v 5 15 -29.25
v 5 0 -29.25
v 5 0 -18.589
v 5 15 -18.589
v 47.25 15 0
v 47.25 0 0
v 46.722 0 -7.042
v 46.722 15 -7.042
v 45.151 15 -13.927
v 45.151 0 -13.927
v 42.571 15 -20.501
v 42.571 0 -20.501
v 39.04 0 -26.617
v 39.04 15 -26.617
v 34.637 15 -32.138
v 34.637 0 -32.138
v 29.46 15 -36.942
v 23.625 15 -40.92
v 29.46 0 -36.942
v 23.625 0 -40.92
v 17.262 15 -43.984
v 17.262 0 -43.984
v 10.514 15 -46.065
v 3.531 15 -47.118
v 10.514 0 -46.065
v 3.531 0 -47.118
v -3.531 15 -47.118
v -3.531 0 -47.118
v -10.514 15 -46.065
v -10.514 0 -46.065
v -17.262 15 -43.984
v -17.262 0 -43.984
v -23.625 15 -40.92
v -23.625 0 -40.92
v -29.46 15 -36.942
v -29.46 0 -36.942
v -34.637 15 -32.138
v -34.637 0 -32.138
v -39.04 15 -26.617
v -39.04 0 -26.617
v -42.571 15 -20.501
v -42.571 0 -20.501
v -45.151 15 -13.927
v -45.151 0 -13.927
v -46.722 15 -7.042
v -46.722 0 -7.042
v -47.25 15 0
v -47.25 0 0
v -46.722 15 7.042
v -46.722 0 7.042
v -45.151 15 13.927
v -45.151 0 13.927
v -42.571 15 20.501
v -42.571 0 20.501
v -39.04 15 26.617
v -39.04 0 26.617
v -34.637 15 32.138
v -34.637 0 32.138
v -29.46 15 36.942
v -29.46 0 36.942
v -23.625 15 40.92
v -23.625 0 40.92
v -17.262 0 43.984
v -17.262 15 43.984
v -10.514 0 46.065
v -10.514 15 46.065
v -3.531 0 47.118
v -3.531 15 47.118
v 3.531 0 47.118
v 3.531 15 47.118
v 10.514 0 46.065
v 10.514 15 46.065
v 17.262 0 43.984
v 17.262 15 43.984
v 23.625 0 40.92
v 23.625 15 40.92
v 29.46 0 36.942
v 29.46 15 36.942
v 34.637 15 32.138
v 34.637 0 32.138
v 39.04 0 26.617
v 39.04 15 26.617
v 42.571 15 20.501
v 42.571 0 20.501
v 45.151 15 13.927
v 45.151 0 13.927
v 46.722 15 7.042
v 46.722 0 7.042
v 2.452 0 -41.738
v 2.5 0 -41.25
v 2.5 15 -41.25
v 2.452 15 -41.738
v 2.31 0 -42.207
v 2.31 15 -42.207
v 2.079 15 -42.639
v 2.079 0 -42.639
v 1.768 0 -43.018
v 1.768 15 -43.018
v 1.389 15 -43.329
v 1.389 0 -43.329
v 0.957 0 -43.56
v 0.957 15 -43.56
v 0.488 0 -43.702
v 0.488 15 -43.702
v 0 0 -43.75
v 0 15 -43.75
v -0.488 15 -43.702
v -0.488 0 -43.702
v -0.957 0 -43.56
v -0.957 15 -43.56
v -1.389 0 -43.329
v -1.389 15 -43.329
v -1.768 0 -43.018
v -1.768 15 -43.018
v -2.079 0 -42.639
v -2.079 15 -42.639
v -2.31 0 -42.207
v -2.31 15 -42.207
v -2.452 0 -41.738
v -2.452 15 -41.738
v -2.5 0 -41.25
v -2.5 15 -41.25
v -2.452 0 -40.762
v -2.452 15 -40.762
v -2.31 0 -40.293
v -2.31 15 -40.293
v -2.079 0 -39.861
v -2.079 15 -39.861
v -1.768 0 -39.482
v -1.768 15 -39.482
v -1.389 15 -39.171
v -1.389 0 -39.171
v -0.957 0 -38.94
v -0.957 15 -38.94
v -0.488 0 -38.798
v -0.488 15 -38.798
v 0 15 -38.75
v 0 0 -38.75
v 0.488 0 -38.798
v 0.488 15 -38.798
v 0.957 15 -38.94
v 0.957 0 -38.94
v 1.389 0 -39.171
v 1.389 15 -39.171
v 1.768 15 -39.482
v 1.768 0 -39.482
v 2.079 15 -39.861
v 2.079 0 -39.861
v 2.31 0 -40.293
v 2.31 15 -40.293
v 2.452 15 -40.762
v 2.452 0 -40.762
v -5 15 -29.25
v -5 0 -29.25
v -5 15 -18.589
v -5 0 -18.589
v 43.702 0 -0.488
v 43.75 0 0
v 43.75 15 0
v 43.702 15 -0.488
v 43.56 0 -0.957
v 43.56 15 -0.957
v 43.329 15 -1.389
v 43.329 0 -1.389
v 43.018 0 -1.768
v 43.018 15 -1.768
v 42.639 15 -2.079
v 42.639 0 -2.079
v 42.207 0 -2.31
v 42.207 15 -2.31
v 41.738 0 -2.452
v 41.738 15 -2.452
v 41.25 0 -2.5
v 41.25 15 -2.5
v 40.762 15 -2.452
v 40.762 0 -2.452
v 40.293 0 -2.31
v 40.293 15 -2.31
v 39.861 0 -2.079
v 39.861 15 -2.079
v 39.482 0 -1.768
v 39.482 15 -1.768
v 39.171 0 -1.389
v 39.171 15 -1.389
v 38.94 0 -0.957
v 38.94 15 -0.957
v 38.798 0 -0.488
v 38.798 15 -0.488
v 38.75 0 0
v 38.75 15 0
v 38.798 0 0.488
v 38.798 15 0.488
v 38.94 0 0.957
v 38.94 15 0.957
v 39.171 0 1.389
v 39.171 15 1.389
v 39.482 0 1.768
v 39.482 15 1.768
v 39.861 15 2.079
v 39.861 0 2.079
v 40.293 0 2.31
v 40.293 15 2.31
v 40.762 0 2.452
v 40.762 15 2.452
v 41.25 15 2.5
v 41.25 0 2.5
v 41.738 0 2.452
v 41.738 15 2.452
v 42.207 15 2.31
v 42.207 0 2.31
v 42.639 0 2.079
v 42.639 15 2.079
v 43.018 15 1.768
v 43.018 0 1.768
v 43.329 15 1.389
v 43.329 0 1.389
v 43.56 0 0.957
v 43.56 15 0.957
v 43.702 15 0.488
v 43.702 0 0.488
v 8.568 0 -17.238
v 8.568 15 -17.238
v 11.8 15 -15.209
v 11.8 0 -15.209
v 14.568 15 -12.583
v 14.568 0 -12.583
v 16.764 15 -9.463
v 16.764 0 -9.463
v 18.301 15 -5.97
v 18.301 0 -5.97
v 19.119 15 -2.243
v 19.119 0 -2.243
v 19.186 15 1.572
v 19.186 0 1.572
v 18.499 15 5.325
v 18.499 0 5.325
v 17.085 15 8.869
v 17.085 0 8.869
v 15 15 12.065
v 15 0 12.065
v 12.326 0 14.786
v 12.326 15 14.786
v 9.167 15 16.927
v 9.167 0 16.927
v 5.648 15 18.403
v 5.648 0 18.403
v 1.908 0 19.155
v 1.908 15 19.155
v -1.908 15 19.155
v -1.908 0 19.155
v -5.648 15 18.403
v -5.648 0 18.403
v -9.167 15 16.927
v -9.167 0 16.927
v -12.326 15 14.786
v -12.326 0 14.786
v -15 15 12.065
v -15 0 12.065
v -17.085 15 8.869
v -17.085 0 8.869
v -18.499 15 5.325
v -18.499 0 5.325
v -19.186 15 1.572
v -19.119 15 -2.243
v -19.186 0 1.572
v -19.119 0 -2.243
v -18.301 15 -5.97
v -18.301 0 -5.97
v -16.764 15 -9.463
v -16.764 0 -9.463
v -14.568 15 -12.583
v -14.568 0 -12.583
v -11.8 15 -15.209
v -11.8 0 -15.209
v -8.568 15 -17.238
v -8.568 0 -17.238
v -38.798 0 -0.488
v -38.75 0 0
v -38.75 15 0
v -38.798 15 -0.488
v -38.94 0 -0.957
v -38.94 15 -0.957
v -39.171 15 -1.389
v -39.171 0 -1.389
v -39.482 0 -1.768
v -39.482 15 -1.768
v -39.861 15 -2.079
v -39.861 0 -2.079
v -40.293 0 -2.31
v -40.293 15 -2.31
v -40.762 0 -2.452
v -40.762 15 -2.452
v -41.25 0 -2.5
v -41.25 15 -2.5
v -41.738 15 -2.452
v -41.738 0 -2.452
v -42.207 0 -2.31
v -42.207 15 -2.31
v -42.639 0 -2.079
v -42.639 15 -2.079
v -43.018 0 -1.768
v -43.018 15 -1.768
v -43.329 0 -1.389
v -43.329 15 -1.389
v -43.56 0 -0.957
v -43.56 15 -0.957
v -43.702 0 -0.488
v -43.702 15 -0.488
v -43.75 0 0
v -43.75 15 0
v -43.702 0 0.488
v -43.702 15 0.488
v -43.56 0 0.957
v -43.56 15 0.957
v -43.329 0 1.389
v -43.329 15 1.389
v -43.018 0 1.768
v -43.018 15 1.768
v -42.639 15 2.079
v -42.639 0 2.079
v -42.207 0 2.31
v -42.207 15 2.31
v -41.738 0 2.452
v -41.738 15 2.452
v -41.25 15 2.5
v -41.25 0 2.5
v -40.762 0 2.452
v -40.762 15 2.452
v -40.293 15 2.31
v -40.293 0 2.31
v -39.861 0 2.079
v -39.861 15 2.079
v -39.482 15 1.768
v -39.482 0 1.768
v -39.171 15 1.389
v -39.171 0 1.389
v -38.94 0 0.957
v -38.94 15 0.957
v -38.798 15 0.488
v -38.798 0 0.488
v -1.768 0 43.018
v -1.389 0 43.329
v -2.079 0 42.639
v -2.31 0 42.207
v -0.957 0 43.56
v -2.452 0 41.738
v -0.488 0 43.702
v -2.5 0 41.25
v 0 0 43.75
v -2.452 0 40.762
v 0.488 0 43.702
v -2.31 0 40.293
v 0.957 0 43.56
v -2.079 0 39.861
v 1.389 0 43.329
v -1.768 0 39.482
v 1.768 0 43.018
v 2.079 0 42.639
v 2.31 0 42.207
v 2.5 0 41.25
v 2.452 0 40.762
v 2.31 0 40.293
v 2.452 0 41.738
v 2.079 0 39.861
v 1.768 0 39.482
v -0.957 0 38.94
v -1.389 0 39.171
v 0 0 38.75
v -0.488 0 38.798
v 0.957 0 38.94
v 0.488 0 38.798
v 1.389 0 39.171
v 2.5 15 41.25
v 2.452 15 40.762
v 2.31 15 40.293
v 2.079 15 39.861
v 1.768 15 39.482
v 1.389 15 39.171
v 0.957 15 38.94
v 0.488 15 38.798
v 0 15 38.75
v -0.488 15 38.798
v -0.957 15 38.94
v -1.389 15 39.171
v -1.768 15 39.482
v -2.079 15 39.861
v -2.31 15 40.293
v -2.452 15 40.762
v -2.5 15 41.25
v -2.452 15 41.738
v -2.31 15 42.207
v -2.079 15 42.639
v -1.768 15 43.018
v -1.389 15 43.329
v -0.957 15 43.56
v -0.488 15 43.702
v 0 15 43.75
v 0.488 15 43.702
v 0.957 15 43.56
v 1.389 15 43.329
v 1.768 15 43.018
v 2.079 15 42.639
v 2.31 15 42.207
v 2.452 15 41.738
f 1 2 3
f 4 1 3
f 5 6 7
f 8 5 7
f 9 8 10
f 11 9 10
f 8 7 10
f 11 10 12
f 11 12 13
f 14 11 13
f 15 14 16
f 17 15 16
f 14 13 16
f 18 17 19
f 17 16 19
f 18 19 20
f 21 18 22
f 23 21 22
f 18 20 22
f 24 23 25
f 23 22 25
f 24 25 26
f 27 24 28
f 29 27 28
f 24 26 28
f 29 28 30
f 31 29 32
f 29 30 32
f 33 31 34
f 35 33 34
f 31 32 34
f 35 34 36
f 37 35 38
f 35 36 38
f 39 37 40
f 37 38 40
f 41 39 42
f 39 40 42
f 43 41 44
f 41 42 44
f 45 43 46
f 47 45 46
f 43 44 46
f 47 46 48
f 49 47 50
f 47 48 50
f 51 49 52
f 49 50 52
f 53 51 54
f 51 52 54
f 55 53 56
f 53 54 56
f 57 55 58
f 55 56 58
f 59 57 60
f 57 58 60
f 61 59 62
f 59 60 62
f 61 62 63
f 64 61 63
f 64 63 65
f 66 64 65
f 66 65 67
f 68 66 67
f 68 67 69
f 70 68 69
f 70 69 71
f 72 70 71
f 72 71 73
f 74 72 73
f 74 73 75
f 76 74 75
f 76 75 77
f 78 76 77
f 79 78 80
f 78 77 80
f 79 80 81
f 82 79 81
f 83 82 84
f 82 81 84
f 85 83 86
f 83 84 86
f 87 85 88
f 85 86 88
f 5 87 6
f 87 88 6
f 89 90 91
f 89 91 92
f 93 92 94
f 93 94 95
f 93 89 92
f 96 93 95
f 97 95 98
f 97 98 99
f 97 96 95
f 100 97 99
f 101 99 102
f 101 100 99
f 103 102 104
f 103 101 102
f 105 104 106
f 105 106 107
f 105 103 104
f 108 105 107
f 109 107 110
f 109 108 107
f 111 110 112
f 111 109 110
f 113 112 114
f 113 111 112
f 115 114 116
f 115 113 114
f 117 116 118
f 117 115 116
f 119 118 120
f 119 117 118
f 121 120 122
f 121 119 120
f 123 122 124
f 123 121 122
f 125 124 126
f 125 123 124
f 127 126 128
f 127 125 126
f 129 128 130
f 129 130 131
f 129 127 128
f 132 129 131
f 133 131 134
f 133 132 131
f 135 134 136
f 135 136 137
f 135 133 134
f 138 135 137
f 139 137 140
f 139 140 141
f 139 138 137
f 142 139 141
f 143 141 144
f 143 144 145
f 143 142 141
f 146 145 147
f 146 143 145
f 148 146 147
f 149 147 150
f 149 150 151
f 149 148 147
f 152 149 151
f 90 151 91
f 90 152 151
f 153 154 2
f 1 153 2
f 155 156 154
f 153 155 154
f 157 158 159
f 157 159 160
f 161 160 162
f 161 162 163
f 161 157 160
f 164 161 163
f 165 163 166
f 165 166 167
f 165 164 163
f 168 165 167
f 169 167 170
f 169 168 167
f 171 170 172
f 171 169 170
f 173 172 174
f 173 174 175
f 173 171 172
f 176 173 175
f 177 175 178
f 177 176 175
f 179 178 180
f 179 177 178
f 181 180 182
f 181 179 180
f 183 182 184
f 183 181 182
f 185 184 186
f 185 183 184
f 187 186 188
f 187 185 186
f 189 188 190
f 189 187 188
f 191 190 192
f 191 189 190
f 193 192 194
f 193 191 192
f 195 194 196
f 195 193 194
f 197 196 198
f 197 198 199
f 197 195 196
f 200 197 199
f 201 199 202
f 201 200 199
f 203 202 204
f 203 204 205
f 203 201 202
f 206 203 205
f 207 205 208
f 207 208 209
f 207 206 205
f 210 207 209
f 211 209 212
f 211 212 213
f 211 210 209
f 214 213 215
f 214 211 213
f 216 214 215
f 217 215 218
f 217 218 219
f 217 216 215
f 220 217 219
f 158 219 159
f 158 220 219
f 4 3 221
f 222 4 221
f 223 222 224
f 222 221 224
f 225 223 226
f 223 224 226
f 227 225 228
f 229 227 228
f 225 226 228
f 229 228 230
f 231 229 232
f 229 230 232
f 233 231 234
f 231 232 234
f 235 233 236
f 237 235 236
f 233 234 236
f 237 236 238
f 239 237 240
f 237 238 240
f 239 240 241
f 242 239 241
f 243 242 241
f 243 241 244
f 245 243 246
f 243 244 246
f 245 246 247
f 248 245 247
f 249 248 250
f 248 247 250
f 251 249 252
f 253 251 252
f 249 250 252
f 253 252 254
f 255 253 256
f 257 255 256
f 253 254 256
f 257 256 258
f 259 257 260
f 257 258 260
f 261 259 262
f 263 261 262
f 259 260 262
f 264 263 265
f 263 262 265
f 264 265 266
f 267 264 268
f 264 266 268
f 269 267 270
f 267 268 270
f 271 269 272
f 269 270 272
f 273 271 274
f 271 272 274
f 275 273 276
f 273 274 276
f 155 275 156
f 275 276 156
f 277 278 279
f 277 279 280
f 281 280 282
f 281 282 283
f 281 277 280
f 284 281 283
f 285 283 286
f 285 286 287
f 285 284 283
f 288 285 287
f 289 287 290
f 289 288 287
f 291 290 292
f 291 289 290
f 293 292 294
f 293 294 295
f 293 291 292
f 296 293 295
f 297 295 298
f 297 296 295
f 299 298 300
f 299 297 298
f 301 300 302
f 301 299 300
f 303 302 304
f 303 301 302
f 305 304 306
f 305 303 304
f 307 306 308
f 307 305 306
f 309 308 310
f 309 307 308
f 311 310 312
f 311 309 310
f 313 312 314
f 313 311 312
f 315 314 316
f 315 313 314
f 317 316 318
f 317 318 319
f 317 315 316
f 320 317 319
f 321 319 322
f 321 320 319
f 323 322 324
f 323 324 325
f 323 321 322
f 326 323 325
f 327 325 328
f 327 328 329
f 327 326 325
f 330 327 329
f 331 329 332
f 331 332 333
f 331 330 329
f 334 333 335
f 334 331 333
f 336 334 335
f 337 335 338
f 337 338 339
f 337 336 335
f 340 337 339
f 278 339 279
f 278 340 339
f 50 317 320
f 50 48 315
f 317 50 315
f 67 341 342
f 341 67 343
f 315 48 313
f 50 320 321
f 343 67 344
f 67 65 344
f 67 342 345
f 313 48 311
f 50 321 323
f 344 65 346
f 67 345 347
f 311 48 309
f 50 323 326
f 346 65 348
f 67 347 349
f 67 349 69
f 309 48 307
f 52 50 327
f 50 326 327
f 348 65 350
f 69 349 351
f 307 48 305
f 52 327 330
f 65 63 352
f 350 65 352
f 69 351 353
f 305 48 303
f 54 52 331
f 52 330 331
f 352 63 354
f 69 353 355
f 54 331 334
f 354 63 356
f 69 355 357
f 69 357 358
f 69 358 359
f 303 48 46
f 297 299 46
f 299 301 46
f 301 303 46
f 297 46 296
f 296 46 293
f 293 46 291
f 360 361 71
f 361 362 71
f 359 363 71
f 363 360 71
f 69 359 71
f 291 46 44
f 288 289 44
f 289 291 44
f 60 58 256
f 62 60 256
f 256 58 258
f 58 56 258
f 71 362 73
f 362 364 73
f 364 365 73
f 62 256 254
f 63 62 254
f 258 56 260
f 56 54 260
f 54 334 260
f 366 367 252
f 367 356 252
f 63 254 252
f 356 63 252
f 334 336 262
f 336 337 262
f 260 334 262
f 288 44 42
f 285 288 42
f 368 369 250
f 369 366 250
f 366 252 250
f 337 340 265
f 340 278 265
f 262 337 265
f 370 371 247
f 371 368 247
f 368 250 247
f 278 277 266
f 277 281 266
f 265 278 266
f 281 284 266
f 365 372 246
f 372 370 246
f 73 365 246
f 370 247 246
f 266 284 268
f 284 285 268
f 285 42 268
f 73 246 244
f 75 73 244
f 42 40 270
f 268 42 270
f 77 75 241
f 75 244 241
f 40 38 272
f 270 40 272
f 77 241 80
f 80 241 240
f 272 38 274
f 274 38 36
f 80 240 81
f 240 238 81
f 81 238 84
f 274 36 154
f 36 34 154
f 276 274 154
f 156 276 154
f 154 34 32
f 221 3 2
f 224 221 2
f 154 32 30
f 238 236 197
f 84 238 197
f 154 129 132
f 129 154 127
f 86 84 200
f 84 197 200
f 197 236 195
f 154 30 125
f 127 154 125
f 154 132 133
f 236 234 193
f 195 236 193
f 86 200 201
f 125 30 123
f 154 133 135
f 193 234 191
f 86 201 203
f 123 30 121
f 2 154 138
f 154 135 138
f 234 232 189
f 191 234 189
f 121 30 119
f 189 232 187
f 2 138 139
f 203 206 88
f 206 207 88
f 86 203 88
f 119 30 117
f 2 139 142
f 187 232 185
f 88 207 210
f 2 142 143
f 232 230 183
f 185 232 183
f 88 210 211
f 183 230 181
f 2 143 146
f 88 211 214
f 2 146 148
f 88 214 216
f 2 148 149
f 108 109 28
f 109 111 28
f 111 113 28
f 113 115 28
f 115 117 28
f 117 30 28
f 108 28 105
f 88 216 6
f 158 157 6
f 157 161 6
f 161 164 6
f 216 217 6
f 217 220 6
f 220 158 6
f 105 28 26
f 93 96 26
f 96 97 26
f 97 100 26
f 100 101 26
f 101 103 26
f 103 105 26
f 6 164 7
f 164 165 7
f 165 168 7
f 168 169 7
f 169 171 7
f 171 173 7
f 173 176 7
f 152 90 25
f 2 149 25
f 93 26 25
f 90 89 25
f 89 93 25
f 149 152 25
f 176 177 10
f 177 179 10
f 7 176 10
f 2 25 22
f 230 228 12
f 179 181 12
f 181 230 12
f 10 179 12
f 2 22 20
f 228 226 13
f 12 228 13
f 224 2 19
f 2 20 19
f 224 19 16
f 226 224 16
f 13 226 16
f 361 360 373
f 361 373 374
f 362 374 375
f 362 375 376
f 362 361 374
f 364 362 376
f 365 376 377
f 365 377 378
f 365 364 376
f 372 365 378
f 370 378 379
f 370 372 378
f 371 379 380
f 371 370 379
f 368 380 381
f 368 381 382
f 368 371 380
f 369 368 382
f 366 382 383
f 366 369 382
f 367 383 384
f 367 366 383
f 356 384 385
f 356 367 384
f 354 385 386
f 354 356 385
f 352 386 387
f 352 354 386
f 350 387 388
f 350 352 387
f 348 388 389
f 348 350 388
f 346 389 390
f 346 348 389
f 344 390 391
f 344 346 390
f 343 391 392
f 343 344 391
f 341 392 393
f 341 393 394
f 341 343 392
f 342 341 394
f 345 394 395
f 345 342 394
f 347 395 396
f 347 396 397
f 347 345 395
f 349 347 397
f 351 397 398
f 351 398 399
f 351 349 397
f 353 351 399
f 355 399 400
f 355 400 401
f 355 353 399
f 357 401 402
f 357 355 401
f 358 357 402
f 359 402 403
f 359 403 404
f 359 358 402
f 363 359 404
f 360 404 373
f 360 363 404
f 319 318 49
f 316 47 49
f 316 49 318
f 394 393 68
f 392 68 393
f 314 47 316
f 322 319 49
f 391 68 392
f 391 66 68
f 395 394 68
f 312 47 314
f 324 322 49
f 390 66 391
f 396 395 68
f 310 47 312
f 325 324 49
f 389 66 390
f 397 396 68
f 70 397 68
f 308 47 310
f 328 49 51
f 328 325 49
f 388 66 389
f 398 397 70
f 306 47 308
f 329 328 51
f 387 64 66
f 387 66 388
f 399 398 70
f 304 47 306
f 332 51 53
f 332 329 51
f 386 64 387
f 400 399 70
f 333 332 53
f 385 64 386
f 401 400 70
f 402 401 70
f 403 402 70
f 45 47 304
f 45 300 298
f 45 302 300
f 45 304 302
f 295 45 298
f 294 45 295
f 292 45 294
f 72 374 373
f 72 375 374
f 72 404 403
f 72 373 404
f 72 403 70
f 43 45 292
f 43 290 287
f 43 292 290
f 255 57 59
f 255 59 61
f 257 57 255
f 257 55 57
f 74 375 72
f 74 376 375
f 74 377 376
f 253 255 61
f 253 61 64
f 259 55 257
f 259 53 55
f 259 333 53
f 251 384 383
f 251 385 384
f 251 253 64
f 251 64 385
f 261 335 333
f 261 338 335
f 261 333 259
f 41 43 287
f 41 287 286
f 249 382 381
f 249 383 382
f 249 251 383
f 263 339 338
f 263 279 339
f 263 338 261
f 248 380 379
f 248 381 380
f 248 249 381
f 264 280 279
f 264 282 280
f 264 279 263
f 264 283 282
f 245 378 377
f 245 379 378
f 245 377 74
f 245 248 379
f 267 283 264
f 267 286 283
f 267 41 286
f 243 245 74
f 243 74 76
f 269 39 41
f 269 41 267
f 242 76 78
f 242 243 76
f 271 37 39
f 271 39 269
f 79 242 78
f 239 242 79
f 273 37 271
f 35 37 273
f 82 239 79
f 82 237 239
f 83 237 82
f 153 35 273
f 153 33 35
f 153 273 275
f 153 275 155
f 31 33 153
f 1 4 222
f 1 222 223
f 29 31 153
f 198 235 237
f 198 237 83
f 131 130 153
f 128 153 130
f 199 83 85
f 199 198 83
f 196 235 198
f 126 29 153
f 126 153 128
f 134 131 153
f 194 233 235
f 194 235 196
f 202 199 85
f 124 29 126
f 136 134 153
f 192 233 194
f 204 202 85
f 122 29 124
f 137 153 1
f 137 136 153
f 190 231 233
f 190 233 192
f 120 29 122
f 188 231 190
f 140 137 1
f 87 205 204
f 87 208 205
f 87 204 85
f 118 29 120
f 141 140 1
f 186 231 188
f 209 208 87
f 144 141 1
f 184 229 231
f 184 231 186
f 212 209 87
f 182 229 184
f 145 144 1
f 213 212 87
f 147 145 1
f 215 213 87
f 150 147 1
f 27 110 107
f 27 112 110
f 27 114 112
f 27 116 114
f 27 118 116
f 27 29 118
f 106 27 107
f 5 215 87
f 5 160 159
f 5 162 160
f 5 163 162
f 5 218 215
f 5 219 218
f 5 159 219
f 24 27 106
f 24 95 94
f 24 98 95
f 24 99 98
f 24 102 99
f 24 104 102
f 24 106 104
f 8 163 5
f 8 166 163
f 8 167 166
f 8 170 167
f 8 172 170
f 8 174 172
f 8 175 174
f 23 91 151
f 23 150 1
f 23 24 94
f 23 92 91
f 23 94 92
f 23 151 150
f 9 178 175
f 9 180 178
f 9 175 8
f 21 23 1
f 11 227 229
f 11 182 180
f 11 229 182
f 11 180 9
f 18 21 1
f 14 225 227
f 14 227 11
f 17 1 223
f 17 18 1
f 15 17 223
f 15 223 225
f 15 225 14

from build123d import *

# Parameters (mm, degrees)
SKETCH1_R           = 47.25
SKETCH1_R_2         = 2.5
BOSS_EXTRUDE1_DEPTH = 15


with BuildPart() as part:
    # Sketch1 → Boss-Extrude1 (new body)
    with BuildSketch(Plane(origin=(0, 0, 0), x_dir=(1, 0, 0), z_dir=(0, 1, 0))):
        Circle(SKETCH1_R)
        with Locations((0, 41.25)):
            Circle(SKETCH1_R_2, mode=Mode.SUBTRACT)
        with Locations((41.25, 0)):
            Circle(SKETCH1_R_2, mode=Mode.SUBTRACT)
        with Locations((0, -41.25)):
            Circle(SKETCH1_R_2, mode=Mode.SUBTRACT)
        with Locations((-41.25, 0)):
            Circle(SKETCH1_R_2, mode=Mode.SUBTRACT)
        with BuildLine():
            Line((-5, 18.589311445), (-5, 29.25))
            Line((-5, 29.25), (5, 29.25))
            Line((5, 29.25), (5, 18.589311445))
            ThreePointArc((5, 18.589311445), (0, -19.25), (-5, 18.589311445))
        make_face(mode=Mode.SUBTRACT)
    extrude(amount=BOSS_EXTRUDE1_DEPTH)


solid = part.part
